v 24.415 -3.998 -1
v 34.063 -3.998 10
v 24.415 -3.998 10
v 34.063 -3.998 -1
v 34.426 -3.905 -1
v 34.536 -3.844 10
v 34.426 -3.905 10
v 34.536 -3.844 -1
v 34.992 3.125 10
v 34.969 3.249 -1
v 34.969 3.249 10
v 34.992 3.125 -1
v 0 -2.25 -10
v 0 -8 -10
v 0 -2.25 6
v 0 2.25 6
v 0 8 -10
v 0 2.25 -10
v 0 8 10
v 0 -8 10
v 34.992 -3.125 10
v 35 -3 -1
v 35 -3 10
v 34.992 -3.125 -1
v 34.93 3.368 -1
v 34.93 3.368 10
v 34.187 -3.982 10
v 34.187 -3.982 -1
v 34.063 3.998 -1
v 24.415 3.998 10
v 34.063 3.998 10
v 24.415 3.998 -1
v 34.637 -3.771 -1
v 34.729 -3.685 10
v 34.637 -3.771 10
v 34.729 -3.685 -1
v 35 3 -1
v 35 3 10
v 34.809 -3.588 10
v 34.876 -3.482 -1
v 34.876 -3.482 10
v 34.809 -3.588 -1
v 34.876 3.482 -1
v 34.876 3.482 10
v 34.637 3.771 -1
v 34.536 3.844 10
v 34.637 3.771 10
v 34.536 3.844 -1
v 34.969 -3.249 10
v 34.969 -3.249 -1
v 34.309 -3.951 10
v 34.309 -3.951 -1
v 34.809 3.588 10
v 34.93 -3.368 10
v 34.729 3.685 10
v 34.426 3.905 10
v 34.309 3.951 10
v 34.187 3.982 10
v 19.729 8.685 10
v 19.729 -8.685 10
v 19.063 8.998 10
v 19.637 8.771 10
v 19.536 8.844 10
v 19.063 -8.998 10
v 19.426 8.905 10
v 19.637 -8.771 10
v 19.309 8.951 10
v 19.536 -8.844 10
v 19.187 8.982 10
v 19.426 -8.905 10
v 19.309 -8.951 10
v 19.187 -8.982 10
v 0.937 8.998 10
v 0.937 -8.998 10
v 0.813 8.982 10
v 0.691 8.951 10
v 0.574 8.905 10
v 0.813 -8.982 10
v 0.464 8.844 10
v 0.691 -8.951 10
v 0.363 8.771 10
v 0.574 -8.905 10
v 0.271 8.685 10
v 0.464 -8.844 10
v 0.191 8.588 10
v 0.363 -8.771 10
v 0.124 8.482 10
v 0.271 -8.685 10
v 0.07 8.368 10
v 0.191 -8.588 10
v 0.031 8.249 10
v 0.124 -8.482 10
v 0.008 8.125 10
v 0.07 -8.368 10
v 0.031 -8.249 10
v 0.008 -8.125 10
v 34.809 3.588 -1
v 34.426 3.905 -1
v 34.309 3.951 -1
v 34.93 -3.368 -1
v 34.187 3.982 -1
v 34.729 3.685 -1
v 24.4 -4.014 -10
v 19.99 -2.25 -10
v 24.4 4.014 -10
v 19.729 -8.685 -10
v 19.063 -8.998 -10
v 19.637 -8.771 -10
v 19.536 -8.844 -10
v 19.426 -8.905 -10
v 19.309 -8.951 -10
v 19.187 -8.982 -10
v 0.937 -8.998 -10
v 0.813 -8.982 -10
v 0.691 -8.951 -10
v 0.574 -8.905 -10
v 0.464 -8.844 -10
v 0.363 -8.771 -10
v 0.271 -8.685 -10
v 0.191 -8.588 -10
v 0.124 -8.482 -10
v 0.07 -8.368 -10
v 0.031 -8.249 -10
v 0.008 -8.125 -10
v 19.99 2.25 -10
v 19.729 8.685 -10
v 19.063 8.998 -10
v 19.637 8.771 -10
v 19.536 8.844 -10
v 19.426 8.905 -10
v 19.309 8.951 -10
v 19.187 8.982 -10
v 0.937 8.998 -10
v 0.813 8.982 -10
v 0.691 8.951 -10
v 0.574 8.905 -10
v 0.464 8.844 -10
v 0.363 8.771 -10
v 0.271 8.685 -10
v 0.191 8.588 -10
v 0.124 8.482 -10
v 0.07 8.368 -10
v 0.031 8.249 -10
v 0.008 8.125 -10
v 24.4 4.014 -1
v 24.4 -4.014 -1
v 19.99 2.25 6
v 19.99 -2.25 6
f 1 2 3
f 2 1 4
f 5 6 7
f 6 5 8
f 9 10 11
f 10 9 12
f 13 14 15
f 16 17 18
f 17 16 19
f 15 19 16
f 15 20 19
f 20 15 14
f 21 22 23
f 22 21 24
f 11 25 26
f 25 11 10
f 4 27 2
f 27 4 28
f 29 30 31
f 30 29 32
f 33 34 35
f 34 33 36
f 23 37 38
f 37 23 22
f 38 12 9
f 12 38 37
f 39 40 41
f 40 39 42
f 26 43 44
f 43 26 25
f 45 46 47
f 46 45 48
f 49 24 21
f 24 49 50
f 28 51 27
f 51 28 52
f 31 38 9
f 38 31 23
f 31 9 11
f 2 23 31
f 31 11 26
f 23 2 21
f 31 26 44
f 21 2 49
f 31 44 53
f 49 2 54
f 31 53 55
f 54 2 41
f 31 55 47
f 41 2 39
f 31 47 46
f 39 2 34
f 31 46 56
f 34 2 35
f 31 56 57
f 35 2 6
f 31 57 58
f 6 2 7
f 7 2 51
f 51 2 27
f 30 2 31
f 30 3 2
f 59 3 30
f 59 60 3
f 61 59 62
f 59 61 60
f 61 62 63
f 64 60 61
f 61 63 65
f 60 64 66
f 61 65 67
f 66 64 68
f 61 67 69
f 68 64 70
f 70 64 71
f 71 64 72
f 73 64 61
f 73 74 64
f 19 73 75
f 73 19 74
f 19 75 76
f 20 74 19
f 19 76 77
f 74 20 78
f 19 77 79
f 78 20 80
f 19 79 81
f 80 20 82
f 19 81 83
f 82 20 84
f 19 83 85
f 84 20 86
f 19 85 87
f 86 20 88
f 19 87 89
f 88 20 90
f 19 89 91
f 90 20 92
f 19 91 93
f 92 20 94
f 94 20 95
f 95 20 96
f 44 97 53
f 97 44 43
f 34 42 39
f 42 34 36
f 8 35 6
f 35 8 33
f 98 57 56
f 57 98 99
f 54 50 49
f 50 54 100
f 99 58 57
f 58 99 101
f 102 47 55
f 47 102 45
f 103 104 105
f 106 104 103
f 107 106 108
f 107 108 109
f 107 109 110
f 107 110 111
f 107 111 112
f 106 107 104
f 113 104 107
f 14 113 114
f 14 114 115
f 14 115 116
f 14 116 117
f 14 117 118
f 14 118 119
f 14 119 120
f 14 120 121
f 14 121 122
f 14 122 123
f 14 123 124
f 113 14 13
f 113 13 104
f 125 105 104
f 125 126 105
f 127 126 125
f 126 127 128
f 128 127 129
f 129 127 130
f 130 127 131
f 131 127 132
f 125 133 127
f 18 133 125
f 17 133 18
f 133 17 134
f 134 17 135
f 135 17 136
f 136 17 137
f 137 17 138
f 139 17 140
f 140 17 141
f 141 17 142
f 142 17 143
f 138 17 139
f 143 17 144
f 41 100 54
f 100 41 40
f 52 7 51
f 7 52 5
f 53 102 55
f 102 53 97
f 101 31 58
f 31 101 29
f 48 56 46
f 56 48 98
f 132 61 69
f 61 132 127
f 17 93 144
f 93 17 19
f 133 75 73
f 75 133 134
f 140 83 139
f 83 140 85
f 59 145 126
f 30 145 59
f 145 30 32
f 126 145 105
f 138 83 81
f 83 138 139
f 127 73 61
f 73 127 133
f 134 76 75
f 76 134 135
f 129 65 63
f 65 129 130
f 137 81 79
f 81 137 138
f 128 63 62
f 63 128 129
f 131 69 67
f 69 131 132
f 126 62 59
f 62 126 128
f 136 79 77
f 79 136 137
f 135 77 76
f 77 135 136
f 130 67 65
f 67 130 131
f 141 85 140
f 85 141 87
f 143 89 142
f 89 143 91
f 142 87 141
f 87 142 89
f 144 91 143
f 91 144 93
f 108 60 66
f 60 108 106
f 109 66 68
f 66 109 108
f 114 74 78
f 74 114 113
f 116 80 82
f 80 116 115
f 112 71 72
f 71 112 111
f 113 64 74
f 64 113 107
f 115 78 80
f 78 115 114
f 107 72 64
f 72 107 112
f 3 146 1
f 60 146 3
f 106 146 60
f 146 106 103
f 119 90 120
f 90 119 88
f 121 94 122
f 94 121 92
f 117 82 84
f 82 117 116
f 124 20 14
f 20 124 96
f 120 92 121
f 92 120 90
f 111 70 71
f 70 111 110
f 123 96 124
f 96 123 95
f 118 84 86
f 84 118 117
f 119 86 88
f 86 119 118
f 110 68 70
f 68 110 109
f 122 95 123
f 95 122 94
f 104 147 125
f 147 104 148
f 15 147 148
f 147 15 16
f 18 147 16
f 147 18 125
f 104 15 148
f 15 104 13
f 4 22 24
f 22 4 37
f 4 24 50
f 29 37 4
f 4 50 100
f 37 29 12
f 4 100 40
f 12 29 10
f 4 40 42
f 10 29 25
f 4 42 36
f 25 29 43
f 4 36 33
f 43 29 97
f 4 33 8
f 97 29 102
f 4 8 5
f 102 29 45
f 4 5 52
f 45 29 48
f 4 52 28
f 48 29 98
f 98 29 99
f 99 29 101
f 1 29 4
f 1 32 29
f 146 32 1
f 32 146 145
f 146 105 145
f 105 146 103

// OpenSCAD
// Stab two at fridge-shelf-holder

// Out measures of holder
length = 40;
width = 37;
height = 15;
underside_height = 3;
solid_width = 21;

// Corner fillet radius
//fillet = 1;

// shelf thickness, + padding
shelf_thickness = 4 + 0.5;
cutout_width = 20;
cutout_offset = 4; // Amount of part not getting a cutout


// Alternative measures
thickness_plate = 18;    // Thickness across the part that holds the class plate
thickness_support = 8;  // Thickness of the support
width = 35;              // Total width of the part
width_plate = 18;        // Width of cutout for plate
width_support = 12;      // Width of part for support
width_transition = width - width_plate - width_support;
thickness_transition = thickness_plate - thickness_support;
corner_radius = 1;       // Add roundness to the corners.
// These makes more sense, when looking at the polygon below.


module main () {
    difference(){
    cube([length,height,width], center = true);

    // And, cut it with this

    translate([0,height/2-shelf_thickness/2-underside_height,solid_width])
    cube([length + 10, shelf_thickness, width], center = true);
    }
}

/*

Ascii art of profile

p1  +----+ p2
    |     \
    |   p3 +----+ p4
    |           |
p0  +-----------+ p5

extruded, mirroed, and gets a partial cutout

*/
module alt_base_shape(length) {
    linear_extrude(height=length, center=true) {
        polygon(points = [
                [corner_radius,0], // p0
                [corner_radius, thickness_plate / 2.0 - corner_radius], // p1
                [corner_radius + width_plate, thickness_plate / 2.0 - corner_radius], // p2
                [corner_radius + width_plate + width_transition, thickness_support / 2.0 - corner_radius], // p3
                [width - corner_radius, thickness_support / 2.0 - corner_radius],
                [width - corner_radius, 0]
            ]);
    }
}

$fn = 50;
module alternative(length, padding) {
    difference() {
        translate([0,0,-corner_radius/2.0]) {
            minkowski() { // Basic shape, without cutout
                union() {
                    alt_base_shape(length-corner_radius);
                    mirror([0,1,0]) {
                        alt_base_shape(length-corner_radius);
                    }
                }
                cylinder(r = corner_radius);
            }
        }
        translate([cutout_width/2.0-0.01,0,-padding]) {
            cube(size=[cutout_width, shelf_thickness, length], center=true);
        }
    } 
}
    
// Corner piece
special_size = 20;
difference() {
    
    alternative(special_size, cutout_offset);
    translate([25+width-width_support+1.4,0,-11])
    cube(size=[50, thickness_support + 2, special_size], center=true);


}

// main();
